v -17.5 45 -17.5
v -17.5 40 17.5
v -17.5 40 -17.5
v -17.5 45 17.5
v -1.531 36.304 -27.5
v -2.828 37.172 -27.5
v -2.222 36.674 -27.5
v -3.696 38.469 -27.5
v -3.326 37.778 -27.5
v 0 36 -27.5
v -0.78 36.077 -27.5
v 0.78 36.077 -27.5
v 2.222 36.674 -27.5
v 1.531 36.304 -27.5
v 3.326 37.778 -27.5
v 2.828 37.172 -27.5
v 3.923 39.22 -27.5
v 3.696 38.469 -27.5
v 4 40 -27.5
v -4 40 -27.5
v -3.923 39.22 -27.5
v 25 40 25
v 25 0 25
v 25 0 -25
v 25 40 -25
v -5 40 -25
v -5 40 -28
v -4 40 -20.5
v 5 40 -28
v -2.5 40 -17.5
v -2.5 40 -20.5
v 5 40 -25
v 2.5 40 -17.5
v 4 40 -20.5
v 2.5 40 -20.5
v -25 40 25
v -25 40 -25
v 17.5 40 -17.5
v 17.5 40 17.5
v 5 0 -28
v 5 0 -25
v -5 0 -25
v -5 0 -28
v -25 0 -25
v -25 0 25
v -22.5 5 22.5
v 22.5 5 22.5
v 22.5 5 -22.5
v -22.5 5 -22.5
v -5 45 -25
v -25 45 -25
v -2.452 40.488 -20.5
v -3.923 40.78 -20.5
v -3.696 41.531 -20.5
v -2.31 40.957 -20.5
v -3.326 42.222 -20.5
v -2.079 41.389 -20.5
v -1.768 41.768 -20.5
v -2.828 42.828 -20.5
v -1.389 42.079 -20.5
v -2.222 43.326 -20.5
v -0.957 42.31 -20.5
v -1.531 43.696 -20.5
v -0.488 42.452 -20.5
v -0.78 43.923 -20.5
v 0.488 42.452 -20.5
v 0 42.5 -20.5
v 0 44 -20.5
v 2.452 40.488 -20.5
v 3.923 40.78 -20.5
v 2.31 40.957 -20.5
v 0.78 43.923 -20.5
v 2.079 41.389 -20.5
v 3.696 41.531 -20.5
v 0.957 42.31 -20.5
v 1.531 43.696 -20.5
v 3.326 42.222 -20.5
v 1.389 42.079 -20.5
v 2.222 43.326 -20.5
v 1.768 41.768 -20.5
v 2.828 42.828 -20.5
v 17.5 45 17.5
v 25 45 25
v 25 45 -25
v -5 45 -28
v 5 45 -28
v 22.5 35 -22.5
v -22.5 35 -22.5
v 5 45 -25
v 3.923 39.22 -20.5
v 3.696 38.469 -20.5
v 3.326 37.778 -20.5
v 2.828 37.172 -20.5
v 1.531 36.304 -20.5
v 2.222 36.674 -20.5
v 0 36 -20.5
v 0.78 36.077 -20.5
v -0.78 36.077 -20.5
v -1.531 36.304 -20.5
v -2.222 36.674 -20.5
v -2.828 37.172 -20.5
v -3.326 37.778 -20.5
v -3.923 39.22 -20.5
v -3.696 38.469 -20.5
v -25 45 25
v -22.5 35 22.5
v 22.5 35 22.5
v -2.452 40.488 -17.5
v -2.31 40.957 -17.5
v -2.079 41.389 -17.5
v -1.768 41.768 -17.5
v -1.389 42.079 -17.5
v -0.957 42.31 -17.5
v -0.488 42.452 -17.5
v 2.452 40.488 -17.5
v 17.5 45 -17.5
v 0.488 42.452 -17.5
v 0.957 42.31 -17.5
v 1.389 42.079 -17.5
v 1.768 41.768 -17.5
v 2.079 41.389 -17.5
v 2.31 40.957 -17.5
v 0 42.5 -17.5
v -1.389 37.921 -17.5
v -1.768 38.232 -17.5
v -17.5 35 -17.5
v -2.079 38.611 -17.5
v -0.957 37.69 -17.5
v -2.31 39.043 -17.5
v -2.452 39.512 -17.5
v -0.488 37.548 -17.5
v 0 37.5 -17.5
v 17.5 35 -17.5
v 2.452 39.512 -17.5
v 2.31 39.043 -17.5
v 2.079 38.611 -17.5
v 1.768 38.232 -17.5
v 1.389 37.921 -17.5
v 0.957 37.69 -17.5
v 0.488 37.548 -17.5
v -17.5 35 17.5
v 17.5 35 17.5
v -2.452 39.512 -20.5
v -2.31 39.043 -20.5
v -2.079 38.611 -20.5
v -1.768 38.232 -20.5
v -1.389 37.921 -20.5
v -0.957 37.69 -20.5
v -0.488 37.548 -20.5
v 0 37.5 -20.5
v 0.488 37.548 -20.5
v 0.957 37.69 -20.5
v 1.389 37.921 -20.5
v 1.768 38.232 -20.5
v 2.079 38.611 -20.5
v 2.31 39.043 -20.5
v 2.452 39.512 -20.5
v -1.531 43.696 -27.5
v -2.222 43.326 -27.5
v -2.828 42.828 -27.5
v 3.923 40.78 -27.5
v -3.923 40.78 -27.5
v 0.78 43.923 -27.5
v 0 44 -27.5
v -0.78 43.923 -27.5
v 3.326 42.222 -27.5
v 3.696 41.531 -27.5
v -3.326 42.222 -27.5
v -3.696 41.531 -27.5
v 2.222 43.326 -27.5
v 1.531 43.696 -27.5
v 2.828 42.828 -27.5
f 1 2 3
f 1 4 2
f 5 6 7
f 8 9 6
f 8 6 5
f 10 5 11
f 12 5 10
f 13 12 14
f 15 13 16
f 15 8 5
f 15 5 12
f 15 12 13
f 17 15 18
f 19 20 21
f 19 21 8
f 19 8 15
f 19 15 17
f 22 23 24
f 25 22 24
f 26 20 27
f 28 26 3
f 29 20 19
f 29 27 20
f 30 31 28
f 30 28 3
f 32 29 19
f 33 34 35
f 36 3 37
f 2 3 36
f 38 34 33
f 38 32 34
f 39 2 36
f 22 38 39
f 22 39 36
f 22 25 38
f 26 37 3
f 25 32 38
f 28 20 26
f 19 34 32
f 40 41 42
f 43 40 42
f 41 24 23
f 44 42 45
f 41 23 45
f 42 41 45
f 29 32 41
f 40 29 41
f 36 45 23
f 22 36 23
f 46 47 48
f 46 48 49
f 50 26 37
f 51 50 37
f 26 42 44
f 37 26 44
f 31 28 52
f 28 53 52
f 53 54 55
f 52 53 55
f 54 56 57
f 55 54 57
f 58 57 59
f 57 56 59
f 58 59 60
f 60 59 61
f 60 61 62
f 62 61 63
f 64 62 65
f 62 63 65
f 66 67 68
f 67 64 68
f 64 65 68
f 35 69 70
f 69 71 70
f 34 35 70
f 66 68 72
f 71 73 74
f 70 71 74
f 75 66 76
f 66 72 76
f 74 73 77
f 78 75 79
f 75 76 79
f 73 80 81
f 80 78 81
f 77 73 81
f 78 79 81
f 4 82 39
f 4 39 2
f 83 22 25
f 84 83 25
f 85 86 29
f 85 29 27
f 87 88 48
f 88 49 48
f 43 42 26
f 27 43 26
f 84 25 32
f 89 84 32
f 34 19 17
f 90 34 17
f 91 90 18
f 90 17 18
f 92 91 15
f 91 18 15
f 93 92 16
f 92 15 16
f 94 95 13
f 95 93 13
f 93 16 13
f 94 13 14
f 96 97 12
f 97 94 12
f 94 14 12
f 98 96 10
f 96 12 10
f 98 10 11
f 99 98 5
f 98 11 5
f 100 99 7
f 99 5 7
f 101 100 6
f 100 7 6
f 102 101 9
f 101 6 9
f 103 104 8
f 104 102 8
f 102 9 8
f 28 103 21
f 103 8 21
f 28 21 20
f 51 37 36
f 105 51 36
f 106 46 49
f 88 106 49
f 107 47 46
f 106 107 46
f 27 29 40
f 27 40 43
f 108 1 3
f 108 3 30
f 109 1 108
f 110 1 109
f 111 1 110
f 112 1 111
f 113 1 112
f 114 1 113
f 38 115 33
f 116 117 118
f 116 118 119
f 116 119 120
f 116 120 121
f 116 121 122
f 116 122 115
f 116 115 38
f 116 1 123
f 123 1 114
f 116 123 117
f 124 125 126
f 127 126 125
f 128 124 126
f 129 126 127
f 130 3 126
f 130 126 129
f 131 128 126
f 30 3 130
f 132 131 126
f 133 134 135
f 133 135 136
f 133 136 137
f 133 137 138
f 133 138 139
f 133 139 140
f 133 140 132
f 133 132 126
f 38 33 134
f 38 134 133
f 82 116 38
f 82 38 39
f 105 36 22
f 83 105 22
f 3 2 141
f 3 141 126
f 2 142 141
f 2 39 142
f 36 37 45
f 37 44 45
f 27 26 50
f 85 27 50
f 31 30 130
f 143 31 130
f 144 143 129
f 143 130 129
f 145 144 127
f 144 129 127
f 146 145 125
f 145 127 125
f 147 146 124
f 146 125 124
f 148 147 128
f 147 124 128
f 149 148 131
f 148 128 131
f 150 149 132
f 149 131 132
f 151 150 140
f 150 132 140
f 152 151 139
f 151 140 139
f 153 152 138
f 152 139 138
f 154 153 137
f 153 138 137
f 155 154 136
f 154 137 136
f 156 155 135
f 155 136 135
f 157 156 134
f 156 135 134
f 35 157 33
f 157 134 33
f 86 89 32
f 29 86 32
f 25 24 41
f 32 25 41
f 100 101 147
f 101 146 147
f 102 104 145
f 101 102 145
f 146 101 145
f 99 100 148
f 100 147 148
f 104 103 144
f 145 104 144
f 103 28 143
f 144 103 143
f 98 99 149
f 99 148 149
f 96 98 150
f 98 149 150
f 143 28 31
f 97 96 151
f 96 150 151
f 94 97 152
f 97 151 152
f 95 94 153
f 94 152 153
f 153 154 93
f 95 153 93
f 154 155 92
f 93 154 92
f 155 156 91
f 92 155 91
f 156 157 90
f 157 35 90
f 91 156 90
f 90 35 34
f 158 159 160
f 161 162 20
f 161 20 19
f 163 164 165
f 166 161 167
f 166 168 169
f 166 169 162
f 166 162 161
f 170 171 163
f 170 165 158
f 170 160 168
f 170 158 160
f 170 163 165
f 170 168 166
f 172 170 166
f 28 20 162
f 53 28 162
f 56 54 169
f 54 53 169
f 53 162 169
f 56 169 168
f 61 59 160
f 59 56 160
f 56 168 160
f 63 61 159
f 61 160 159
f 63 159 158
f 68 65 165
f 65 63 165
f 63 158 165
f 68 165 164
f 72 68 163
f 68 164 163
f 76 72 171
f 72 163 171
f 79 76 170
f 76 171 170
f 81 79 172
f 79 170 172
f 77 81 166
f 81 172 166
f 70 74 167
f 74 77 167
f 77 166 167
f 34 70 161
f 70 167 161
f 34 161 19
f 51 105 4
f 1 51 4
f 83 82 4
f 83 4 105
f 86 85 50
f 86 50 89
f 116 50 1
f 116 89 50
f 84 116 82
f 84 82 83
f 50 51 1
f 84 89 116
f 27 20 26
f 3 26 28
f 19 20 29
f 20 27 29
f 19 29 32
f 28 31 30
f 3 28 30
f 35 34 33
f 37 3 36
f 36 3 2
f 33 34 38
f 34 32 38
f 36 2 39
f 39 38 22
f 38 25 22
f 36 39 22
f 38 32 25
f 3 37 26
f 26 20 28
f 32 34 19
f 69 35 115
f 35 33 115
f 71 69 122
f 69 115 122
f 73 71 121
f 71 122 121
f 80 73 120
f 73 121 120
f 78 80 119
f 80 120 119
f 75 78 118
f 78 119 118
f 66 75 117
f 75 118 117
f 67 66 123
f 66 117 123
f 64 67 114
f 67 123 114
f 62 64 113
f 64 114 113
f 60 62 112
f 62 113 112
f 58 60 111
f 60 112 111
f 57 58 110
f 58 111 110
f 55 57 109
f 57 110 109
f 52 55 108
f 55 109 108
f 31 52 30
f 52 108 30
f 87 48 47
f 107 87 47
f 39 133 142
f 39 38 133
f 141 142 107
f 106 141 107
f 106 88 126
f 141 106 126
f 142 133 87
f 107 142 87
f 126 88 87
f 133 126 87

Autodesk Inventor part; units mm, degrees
ref_plane "YZ Plane" through (0, 0, 0) normal (1, 0, 0) x (0, 1, 0)
ref_plane "XZ Plane" through (0, 0, 0) normal (0, 1, 0) x (-1, 0, 0)
ref_plane "XY Plane" through (0, 0, 0) normal (0, 0, 1) x (1, 0, 0)
sketch "Sketch1" plane through (0, 0, 0) normal (0, 1, 0) x (-1, 0, 0)
  line L0 (-25, -25) -> (25, -25)
  line L1 (25, -25) -> (25, 25)
  line L2 (25, 25) -> (-25, 25)
  line L3 (-25, 25) -> (-25, -25)
  line L4 (-25, -25) -> (25, 25) construction
  line L5 (25, -25) -> (-25, 25) construction
  line L6 (-22.5, 22.5) -> (22.5, 22.5)
  line L7 (22.5, 22.5) -> (22.5, -22.5)
  line L8 (22.5, -22.5) -> (-22.5, -22.5)
  line L9 (-22.5, -22.5) -> (-22.5, 22.5)
  line L10 (-22.5, 22.5) -> (22.5, -22.5) construction
  line L11 (22.5, 22.5) -> (-22.5, -22.5) construction
  point P0 (0, 0)
  dimension "d0" = 50
  dimension "d1" = 50
  dimension "d2" = 45
  dimension "d3" = 45
extrude "Extrusion1" add sketch "Sketch1" along normal blind 5 contours L6 L7 L8 L9
extrude "Extrusion2" add sketch "Sketch1" along normal blind 45
sketch "Sketch2" plane through (0, 45, 0) normal (0, 1, 0) x (1, 0, 0)
  line L0 (22.5, 22.5) -> (22.5, -22.5) projected
  line L1 (-22.5, -22.5) -> (22.5, -22.5)
  line L2 (22.5, -22.5) -> (22.5, 22.5)
  line L3 (22.5, 22.5) -> (-22.5, 22.5)
  line L4 (-22.5, 22.5) -> (-22.5, -22.5)
  line L5 (17.5, -17.5) -> (-17.5, -17.5)
  line L6 (-17.5, -17.5) -> (-17.5, 17.5)
  line L7 (-17.5, 17.5) -> (17.5, 17.5)
  line L8 (17.5, 17.5) -> (17.5, -17.5)
  line L9 (17.5, -17.5) -> (-17.5, 17.5) construction
  line L10 (-17.5, -17.5) -> (17.5, 17.5) construction
  point P0 (0, 0)
  dimension "d8" = 35
  dimension "d9" = 35
extrude "Extrusion3" add sketch "Sketch2" against normal blind 10
sketch "Sketch3" plane through (25, 0, -25) normal (0, 0, -1) x (-1, 0, 0)
  line L0 (50, 45) -> (0, 45) projected
  line L1 (25, 45) -> (25, 0)
  line L2 (20, 0) -> (30, 0)
  line L3 (30, 0) -> (30, 45)
  line L4 (30, 45) -> (20, 45)
  line L5 (20, 45) -> (20, 0)
  line L6 (20, 0) -> (30, 45) construction
  line L7 (30, 0) -> (20, 45) construction
  point P0 (25, 22.5)
  dimension "d12" = 10
extrude "Extrusion4" add sketch "Sketch3" along normal blind 3
sketch "Sketch4" plane through (-17.5, 45, -17.5) normal (0, 0, 1) x (1, 0, 0)
  line L0 (0, 0) -> (35, 0) projected
  line L1 (17.5, 0) -> (17.5, -10)
  line L2 (35, -10) -> (0, -10) projected
  circle A0 centre (17.5, -5) radius 2.5
  point P0 (17.5, -45)
  dimension "d15" = 5
extrude "Extrusion5" cut sketch "Sketch4" against normal blind 10
ref_plane "Work Plane1" through (0, 40, 0) normal (0, 1, 0) x (1, 0, 0)
split body "Split1" result two bodies by plane through (0, 40, 0) normal (0, 1, 0) first body at (-22.5, 44.5, -5.8333)
sketch "Sketch6" plane through (-17.5, 45, -27.5) normal (0, 0, 1) x (1, 0, 0)
  line L0 (20, -5) -> (15, -5) projected
  circle A0 centre (17.5, -5) radius 4
  point P0 (17.5, -45)
  dimension "d19" = 8
extrude "Extrusion6" cut sketch "Sketch6" along normal blind 7 bodies 3
sketch "Sketch7" plane through (-17.5, 45, -27.5) normal (0, 0, 1) x (1, 0, 0)
  line L0 (20, -5) -> (15, -5) projected
  circle A0 centre (17.5, -5) radius 4
  point P0 (17.5, -45)
  dimension "d22" = 8
extrude "Extrusion7" cut sketch "Sketch7" along normal blind 7 bodies 2
properties part number "Pudelko"
